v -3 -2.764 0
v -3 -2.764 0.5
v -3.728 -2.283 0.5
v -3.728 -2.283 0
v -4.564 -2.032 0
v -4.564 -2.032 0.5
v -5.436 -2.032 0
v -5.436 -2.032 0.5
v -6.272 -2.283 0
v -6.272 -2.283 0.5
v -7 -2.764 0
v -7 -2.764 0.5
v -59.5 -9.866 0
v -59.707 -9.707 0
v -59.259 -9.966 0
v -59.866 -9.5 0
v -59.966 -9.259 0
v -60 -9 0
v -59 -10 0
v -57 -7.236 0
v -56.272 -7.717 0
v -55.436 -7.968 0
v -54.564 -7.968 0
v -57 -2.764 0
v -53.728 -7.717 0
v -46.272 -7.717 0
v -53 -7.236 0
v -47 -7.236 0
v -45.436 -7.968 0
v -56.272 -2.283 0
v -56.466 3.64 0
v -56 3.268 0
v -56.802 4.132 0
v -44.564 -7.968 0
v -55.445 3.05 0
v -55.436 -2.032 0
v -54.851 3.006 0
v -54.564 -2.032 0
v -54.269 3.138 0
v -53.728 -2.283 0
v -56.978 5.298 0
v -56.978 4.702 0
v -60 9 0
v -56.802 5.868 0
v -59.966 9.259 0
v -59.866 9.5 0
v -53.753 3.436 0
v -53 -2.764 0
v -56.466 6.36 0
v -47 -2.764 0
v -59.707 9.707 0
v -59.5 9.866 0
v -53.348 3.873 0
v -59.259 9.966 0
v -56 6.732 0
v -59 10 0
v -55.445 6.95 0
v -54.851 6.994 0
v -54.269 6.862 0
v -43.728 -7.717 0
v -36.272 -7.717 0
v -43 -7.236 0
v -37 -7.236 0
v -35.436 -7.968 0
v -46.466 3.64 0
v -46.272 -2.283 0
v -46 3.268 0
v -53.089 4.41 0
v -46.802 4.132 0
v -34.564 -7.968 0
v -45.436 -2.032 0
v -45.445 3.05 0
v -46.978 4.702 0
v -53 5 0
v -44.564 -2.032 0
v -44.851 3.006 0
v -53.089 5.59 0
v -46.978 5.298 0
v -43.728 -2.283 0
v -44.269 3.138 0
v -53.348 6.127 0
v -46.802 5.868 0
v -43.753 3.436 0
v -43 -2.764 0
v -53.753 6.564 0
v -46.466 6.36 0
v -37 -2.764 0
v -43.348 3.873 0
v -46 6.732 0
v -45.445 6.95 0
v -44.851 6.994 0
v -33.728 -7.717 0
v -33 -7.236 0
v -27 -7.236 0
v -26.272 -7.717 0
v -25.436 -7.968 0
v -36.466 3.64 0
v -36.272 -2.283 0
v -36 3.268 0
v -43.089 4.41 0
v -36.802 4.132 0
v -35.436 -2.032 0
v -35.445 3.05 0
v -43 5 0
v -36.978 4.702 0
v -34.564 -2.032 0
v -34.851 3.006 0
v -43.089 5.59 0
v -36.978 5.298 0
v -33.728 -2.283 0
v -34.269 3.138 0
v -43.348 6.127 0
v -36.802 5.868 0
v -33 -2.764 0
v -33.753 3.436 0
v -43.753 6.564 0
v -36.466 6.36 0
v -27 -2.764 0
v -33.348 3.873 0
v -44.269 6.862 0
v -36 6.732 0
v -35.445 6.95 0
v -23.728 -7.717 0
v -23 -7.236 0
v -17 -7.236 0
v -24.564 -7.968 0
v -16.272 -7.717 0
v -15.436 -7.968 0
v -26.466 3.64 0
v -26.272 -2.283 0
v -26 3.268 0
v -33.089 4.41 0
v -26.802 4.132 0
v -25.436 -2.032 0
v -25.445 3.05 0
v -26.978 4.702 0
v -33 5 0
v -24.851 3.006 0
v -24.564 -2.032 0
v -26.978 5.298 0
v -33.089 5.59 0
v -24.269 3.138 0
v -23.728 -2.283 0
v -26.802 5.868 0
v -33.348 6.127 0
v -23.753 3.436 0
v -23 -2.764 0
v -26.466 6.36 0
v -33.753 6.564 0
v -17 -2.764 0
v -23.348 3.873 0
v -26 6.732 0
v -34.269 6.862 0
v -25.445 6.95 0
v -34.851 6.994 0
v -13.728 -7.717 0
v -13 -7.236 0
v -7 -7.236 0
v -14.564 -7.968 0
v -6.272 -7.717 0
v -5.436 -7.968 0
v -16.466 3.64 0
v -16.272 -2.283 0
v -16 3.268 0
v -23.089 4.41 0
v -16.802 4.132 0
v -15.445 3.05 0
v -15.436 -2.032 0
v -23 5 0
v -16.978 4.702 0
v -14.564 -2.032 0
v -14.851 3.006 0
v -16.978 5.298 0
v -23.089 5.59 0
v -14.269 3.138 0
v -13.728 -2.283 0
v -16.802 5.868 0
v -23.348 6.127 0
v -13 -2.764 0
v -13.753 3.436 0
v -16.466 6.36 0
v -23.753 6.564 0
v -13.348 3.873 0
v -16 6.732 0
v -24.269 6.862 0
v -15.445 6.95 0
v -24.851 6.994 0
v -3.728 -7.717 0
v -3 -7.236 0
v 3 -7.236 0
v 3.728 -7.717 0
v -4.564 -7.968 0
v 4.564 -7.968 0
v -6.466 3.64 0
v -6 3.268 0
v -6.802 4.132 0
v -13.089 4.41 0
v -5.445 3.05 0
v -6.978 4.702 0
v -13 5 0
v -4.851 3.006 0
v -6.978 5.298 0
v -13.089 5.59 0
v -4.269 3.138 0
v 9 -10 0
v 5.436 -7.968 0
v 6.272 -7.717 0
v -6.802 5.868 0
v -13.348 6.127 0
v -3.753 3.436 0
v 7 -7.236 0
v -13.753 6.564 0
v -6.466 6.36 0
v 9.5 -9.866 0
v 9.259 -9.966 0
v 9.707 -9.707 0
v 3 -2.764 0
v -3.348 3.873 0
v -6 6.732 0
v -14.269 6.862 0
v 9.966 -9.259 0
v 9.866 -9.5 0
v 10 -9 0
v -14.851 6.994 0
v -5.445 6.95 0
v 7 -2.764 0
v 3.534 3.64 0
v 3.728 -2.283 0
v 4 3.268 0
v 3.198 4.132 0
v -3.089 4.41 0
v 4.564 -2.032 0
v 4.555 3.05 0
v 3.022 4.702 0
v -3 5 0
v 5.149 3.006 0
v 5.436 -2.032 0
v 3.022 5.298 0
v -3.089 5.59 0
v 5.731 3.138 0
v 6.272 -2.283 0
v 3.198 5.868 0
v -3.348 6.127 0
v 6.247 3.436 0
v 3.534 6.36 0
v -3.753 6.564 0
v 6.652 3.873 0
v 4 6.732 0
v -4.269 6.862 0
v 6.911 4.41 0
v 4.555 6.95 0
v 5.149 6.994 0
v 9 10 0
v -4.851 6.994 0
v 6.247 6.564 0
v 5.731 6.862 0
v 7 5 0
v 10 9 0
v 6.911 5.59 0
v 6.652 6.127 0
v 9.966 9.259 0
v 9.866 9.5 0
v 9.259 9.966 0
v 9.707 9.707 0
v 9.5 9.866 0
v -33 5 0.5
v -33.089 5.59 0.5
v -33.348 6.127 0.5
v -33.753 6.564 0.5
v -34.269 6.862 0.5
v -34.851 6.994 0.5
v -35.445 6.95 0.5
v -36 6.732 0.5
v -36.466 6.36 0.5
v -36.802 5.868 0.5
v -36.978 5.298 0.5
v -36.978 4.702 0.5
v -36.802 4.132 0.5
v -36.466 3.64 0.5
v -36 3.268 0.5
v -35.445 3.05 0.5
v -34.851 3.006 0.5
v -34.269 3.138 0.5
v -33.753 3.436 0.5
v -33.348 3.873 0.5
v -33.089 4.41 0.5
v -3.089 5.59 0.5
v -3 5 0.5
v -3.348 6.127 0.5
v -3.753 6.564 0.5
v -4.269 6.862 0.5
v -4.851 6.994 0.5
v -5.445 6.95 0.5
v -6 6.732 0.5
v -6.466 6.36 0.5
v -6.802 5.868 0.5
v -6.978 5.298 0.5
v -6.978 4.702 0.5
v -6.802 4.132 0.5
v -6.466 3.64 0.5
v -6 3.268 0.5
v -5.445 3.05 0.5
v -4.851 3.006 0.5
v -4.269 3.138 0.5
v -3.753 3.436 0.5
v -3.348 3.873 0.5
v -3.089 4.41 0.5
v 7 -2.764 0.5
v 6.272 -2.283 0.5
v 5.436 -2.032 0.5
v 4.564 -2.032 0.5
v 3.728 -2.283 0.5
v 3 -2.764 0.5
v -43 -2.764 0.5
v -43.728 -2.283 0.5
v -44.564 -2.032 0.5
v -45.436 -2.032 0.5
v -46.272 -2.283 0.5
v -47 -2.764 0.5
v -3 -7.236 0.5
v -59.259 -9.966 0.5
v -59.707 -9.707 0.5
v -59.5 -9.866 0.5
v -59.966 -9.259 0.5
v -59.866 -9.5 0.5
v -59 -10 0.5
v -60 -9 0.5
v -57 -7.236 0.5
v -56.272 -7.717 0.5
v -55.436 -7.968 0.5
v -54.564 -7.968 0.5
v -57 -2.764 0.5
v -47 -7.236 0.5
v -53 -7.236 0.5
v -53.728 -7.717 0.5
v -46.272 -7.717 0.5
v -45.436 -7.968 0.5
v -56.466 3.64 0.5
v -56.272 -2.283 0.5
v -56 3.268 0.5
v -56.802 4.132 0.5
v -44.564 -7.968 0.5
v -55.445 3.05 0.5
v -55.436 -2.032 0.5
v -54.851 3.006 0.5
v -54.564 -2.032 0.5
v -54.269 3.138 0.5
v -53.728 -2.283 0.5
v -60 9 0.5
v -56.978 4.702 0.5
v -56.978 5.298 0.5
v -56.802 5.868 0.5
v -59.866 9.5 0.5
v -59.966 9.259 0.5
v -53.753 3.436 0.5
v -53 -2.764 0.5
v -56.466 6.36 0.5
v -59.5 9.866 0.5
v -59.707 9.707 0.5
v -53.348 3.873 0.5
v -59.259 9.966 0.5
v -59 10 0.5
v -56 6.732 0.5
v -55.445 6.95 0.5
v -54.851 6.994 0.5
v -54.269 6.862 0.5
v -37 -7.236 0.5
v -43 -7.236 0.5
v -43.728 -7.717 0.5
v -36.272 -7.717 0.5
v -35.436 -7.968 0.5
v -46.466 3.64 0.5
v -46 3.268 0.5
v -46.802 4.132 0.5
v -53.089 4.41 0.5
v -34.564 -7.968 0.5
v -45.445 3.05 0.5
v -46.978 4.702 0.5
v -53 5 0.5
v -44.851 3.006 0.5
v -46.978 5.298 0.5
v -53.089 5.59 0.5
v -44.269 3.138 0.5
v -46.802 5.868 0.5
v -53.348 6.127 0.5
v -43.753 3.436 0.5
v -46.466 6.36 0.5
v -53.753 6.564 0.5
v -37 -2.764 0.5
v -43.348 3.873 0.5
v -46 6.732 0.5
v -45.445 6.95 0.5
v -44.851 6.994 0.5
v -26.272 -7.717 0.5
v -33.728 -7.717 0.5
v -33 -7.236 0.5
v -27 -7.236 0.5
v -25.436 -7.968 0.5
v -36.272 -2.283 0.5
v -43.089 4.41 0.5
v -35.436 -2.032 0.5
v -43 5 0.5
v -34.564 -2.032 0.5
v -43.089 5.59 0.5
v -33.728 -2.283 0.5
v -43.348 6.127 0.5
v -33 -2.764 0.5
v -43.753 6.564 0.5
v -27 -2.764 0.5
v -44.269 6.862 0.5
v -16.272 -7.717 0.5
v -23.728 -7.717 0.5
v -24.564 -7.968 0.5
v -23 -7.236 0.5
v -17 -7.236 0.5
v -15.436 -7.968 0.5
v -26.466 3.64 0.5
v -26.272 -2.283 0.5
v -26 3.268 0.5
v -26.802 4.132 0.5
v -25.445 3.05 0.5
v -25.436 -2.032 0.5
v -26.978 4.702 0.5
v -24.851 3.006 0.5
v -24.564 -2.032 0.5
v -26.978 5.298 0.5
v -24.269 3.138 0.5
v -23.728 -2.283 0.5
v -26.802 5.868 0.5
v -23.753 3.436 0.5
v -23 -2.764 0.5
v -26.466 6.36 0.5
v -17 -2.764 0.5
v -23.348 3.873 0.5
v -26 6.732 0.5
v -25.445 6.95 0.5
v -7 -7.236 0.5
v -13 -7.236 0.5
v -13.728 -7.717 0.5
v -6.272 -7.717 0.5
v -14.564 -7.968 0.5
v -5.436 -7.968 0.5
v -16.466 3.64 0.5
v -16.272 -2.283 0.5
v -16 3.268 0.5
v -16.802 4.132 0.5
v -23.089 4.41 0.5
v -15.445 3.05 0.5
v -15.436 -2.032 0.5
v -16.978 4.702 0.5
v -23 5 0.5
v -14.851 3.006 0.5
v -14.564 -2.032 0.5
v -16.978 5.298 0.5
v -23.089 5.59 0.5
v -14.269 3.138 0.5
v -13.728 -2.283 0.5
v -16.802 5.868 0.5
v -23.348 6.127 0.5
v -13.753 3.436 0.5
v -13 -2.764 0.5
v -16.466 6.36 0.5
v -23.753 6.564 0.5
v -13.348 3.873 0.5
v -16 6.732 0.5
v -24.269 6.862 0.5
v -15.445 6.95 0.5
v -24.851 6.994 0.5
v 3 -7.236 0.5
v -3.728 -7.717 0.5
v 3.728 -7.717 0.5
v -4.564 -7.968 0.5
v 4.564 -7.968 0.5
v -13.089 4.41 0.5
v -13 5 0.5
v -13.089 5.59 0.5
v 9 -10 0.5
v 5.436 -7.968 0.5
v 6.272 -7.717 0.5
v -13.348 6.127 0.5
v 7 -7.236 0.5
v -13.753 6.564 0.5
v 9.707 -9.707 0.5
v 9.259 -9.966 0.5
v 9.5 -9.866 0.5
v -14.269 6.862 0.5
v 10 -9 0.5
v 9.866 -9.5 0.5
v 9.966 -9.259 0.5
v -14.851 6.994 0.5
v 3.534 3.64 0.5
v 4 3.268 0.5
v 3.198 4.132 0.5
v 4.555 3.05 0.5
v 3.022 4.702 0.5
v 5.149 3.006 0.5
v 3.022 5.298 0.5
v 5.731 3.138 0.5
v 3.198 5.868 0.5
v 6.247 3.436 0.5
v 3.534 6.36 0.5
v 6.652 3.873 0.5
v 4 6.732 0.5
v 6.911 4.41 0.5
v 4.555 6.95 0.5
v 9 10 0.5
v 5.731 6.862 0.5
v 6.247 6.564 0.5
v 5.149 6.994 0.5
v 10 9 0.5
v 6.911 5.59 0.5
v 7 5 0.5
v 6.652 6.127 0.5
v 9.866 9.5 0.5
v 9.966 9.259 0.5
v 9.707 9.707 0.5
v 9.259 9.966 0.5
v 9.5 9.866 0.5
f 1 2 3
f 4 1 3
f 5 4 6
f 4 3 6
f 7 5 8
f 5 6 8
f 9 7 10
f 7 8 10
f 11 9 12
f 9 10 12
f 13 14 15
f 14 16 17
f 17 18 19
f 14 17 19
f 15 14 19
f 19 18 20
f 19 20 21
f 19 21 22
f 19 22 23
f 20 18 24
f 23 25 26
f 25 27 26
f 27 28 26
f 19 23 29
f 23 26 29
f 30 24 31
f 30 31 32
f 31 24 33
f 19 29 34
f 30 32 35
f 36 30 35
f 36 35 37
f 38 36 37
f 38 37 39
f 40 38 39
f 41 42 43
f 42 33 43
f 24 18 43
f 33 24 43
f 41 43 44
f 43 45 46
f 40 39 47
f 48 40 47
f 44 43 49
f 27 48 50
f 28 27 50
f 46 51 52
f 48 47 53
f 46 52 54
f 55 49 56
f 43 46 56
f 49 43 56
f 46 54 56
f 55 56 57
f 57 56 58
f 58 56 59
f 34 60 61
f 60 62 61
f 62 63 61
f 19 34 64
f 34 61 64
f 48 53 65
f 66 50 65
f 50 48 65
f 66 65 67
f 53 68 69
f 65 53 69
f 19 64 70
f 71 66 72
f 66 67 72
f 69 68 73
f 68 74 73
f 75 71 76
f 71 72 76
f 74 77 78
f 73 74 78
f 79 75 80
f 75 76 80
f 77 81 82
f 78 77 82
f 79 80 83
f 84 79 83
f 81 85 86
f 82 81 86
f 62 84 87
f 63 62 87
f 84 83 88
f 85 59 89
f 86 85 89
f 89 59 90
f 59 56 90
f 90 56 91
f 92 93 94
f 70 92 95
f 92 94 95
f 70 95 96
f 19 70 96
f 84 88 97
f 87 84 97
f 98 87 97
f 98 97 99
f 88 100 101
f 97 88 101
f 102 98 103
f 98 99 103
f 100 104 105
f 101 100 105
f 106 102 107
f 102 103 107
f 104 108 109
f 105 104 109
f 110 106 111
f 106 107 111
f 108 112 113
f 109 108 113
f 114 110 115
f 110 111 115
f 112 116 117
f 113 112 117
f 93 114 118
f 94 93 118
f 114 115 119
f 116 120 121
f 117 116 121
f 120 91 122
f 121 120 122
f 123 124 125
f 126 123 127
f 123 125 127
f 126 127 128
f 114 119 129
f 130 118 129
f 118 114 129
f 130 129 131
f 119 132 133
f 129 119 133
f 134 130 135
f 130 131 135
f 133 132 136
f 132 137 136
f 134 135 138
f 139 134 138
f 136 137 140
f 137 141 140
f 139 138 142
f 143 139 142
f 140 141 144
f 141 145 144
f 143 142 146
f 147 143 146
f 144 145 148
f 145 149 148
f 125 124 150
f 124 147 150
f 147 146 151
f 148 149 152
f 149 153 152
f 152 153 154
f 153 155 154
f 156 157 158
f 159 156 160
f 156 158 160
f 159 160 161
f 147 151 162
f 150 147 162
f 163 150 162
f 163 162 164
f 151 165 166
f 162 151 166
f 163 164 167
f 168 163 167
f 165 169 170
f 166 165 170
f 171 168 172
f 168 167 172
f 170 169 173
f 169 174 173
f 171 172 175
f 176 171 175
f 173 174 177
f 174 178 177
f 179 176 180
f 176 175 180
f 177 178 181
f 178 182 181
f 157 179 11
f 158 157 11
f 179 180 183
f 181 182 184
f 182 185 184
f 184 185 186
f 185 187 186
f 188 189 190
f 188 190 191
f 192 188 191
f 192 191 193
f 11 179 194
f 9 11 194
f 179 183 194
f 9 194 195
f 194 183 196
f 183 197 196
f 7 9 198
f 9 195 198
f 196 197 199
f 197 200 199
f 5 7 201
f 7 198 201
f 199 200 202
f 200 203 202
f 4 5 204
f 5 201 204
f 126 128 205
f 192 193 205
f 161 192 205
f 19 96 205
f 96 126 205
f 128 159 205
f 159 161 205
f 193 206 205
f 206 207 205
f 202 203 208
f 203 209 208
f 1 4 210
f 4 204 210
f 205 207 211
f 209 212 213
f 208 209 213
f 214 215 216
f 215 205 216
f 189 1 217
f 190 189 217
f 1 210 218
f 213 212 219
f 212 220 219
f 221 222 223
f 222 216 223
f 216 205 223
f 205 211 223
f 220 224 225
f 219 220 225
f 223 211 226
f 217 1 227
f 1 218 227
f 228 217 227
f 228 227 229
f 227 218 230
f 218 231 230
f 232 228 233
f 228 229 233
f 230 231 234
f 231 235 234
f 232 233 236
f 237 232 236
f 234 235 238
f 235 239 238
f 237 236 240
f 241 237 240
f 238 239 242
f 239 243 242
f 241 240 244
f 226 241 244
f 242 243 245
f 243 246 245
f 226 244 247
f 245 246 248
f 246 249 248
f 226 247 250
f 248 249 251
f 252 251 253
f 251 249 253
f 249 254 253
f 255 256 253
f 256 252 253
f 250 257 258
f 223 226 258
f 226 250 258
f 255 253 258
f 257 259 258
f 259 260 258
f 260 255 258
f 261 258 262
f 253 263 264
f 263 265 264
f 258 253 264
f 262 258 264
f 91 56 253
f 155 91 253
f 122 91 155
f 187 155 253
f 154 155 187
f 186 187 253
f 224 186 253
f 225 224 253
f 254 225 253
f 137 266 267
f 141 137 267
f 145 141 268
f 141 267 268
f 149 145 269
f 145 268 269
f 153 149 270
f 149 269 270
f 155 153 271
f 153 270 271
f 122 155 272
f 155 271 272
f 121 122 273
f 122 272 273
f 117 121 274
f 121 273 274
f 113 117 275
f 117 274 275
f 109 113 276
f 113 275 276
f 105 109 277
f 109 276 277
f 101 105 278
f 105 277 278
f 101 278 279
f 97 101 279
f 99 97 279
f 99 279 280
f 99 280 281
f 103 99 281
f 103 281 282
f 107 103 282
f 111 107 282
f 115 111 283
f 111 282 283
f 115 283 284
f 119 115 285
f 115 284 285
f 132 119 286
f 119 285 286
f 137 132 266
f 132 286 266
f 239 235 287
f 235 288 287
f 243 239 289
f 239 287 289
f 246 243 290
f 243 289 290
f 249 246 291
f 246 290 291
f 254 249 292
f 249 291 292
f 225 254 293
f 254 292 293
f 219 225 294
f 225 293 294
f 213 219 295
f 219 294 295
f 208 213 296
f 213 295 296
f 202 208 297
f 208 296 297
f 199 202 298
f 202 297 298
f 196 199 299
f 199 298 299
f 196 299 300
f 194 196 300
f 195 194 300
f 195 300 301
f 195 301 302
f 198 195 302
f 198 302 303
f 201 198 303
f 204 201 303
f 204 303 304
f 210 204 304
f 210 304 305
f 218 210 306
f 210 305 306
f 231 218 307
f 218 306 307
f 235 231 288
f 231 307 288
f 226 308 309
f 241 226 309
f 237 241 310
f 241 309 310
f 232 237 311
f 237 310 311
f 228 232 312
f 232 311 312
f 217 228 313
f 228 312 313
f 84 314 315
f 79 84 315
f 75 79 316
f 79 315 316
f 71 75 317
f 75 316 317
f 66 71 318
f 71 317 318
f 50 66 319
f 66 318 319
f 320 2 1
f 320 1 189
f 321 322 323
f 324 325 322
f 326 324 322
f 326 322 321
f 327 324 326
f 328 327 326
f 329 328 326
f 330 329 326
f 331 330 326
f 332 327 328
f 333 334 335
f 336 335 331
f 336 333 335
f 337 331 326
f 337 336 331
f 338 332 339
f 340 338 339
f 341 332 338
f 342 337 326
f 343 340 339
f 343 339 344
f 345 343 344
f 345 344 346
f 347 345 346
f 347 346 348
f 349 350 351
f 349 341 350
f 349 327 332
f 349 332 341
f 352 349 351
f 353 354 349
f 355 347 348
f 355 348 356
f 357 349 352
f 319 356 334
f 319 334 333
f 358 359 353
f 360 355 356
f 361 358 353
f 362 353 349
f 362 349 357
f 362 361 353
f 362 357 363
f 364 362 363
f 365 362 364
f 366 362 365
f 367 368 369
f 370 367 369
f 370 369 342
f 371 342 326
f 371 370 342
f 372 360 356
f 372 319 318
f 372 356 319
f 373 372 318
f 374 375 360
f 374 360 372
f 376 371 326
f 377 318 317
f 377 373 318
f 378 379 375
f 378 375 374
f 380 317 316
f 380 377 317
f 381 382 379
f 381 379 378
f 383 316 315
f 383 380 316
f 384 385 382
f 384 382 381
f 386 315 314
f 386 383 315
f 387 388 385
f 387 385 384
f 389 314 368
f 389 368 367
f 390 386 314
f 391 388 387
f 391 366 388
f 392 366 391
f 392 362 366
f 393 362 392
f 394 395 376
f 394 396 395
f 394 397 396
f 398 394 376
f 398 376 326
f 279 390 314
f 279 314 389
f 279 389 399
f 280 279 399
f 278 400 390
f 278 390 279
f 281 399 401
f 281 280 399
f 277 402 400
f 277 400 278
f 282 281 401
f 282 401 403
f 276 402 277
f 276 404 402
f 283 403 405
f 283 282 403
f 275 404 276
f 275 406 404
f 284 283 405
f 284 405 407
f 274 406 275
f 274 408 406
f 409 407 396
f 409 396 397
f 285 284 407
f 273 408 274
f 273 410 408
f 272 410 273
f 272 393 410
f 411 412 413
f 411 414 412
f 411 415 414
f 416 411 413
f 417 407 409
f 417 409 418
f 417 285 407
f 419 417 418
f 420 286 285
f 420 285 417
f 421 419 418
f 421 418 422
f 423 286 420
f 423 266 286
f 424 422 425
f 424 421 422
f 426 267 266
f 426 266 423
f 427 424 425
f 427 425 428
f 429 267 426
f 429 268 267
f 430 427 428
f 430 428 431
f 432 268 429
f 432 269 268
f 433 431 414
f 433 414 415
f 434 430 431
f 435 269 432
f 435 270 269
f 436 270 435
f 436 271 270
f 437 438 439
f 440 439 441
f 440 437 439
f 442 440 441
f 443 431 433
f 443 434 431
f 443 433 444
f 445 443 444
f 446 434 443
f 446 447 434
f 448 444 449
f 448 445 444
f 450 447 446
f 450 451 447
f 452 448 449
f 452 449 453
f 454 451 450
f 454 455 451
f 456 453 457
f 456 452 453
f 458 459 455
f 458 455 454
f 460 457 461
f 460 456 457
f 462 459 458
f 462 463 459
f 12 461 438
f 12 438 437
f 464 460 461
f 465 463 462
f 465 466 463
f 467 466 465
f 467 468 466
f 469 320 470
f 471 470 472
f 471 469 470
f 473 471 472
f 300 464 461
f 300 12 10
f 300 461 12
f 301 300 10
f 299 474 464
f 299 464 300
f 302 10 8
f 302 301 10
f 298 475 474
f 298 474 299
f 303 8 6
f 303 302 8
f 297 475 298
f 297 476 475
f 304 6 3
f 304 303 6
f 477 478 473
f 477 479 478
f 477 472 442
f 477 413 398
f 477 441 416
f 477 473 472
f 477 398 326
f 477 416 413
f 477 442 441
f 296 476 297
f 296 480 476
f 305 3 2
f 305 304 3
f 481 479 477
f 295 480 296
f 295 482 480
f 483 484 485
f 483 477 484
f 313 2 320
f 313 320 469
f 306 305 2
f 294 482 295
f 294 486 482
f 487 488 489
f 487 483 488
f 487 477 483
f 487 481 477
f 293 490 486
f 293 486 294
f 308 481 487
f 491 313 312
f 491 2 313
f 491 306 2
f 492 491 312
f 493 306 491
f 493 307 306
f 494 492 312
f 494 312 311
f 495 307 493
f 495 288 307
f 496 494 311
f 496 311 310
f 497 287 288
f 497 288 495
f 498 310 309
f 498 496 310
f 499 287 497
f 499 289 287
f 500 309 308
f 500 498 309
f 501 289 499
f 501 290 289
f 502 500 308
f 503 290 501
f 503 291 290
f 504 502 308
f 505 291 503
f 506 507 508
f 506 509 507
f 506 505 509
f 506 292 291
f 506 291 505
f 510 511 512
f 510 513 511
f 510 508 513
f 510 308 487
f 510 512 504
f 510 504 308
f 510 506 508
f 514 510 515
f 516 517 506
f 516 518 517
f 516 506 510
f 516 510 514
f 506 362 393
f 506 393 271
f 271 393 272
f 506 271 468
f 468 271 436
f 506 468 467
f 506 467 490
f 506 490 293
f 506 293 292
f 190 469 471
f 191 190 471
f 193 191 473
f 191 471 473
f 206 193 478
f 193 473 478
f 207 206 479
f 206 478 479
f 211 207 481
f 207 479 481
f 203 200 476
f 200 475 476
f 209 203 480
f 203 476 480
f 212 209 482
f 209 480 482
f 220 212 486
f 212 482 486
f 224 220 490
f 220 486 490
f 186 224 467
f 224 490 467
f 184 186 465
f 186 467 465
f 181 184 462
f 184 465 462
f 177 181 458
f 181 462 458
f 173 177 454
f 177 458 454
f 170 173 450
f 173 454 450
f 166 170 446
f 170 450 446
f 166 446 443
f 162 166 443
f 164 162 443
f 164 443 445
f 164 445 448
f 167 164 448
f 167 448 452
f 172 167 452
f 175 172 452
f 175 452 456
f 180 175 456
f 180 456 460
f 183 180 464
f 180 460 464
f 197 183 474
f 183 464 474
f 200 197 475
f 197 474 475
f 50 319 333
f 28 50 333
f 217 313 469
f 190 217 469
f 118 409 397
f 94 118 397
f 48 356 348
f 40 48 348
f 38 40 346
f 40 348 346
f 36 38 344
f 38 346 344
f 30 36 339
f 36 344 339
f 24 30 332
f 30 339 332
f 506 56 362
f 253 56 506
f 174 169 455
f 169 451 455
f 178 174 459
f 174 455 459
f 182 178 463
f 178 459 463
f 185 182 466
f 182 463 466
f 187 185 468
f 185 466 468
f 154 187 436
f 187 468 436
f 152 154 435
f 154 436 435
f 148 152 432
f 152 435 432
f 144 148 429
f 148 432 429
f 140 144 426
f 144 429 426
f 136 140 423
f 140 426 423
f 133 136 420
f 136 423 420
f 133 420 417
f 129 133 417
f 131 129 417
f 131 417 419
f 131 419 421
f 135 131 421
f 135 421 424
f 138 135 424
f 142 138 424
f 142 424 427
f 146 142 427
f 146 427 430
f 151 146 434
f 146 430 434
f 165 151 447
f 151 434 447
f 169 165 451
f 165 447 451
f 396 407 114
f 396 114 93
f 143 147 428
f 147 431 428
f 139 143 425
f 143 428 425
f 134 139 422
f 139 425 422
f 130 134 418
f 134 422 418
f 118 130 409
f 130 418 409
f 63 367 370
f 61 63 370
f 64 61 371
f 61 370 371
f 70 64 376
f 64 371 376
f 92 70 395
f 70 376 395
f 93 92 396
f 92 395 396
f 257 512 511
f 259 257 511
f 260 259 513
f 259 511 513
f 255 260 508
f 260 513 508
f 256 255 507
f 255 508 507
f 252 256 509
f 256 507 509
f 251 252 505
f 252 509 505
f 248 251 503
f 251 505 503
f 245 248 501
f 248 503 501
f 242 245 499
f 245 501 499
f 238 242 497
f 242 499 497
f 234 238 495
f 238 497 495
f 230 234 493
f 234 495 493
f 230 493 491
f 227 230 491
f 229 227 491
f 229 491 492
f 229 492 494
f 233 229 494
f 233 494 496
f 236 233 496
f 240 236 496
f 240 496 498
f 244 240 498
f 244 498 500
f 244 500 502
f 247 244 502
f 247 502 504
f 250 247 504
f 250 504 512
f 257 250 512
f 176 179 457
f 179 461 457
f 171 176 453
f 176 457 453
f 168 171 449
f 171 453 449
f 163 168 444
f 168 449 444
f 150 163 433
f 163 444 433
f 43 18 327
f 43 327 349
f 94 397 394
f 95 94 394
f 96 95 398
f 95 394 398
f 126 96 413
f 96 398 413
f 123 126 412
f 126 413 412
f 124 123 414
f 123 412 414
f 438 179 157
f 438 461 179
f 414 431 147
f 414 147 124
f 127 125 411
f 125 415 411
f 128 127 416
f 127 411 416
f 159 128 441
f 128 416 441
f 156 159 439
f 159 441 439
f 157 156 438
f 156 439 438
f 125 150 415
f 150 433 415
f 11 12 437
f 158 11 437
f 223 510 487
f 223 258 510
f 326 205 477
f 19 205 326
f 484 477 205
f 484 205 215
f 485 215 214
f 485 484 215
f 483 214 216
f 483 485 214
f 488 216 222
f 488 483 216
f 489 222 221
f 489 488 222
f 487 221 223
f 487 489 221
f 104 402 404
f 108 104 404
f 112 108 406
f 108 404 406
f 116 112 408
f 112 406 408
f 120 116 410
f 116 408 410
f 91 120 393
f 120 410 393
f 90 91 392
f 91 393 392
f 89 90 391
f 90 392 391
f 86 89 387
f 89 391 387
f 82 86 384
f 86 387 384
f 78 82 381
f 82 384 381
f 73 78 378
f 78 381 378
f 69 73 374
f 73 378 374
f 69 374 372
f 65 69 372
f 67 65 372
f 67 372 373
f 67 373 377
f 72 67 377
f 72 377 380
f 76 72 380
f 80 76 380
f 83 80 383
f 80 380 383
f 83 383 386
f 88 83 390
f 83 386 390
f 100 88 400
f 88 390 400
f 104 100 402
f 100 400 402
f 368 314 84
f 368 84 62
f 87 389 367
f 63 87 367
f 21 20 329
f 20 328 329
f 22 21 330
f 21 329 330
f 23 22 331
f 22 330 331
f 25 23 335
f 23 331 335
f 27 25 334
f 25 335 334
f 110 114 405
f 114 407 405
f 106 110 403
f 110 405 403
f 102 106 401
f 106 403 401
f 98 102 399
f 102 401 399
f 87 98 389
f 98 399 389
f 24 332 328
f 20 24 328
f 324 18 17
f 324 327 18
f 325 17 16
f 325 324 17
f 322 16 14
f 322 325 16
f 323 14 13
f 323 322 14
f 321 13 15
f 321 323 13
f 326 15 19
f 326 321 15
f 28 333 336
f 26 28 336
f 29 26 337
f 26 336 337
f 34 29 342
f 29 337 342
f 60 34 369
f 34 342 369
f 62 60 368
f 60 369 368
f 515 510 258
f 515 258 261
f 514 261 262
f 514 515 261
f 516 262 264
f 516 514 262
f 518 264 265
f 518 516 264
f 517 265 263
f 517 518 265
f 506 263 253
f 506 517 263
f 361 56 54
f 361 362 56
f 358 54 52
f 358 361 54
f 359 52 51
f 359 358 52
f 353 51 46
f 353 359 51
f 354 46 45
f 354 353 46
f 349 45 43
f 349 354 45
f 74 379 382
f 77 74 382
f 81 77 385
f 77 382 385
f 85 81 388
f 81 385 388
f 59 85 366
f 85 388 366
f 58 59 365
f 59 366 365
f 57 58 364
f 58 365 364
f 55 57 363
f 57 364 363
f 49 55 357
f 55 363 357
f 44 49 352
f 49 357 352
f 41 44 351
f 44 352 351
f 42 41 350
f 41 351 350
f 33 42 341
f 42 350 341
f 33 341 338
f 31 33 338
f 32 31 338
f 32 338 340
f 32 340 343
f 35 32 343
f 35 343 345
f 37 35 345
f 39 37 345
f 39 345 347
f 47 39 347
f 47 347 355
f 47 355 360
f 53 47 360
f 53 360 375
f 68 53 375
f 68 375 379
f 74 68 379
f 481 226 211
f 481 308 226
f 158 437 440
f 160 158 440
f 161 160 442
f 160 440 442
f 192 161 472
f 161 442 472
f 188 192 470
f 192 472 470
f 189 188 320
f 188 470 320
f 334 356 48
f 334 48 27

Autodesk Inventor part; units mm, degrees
ref_plane "YZ Plane" through (0, 0, 0) normal (1, 0, 0) x (0, 1, 0)
ref_plane "XZ Plane" through (0, 0, 0) normal (0, 1, 0) x (-1, 0, 0)
ref_plane "XY Plane" through (0, 0, 0) normal (0, 0, 1) x (1, 0, 0)
sketch "Náčrt1" plane through (0, 0, 0) normal (0, 0, 1) x (1, 0, 0)
  line L0 (-60, 10) -> (10, 10)
  line L1 (10, 10) -> (10, -10)
  line L2 (10, -10) -> (-60, -10)
  line L3 (-60, -10) -> (-60, 10)
  point P0 (0, 0)
  dimension "d0" = 20
  dimension "d1" = 70
  dimension "d2" = 10
  dimension "d3" = 10
extrude "Vysunutí1" add sketch "Náčrt1" along normal blind 0.5
sketch "Náčrt2" plane through (0, 0, 0.5) normal (0, 0, 1) x (1, 0, 0)
  circle A0 centre (-55, 5) radius 2
  line L0 (10, 10) -> (-60, 10) projected
  line L1 (-60, 10) -> (-60, -10) projected
  point P0 (0, 0)
  dimension "d6" = 4
  dimension "d7" = 5
  dimension "d8" = 5
extrude "Vysunutí2" cut sketch "Náčrt2" against normal blind 0.5
pattern_linear "Obdélníkové pole1" count 7 spacing 10 along (1, 0, 0) of "Vysunutí2"
fillet "Zaoblení1" radius 1 1 edges at (10, 10, 0.25)
fillet "Zaoblení2" radius 1 2 edges at (-60, 10, 0.25) (-60, -10, 0.25)
fillet "Zaoblení3" radius 1 1 edges at (10, -10, 0.25)
sketch "Náčrt3" plane through (0, 0, 0.5) normal (0, 0, 1) x (1, 0, 0)
  line L0 (7, -2.7639) -> (7, -7.2361)
  line L1 (3, -2.7639) -> (3, -7.2361)
  arc A0 (7, -2.7639) -> (3, -2.7639) centre (5, -5) ccw
  arc A1 (3, -7.2361) -> (7, -7.2361) centre (5, -5) ccw
  line L2 (10, -9) -> (10, 9) projected
  line L3 (-59, -10) -> (9, -10) projected
  point P0 (0, 0)
  point P1 (3, -7.229)
  point P2 (5, -8)
  point P3 (5, -2)
  dimension "d24" = 2
  dimension "d25" = 4
  dimension "d26" = 5
  dimension "d27" = 5
  dimension "d28" = 3
  dimension "d29" = 3
extrude "Vysunutí3" cut sketch "Náčrt3" against normal blind 10
pattern_linear "Obdélníkové pole2" count 7 spacing 10 along (-1, 0, 0) of "Vysunutí3"
properties part number "1021"
